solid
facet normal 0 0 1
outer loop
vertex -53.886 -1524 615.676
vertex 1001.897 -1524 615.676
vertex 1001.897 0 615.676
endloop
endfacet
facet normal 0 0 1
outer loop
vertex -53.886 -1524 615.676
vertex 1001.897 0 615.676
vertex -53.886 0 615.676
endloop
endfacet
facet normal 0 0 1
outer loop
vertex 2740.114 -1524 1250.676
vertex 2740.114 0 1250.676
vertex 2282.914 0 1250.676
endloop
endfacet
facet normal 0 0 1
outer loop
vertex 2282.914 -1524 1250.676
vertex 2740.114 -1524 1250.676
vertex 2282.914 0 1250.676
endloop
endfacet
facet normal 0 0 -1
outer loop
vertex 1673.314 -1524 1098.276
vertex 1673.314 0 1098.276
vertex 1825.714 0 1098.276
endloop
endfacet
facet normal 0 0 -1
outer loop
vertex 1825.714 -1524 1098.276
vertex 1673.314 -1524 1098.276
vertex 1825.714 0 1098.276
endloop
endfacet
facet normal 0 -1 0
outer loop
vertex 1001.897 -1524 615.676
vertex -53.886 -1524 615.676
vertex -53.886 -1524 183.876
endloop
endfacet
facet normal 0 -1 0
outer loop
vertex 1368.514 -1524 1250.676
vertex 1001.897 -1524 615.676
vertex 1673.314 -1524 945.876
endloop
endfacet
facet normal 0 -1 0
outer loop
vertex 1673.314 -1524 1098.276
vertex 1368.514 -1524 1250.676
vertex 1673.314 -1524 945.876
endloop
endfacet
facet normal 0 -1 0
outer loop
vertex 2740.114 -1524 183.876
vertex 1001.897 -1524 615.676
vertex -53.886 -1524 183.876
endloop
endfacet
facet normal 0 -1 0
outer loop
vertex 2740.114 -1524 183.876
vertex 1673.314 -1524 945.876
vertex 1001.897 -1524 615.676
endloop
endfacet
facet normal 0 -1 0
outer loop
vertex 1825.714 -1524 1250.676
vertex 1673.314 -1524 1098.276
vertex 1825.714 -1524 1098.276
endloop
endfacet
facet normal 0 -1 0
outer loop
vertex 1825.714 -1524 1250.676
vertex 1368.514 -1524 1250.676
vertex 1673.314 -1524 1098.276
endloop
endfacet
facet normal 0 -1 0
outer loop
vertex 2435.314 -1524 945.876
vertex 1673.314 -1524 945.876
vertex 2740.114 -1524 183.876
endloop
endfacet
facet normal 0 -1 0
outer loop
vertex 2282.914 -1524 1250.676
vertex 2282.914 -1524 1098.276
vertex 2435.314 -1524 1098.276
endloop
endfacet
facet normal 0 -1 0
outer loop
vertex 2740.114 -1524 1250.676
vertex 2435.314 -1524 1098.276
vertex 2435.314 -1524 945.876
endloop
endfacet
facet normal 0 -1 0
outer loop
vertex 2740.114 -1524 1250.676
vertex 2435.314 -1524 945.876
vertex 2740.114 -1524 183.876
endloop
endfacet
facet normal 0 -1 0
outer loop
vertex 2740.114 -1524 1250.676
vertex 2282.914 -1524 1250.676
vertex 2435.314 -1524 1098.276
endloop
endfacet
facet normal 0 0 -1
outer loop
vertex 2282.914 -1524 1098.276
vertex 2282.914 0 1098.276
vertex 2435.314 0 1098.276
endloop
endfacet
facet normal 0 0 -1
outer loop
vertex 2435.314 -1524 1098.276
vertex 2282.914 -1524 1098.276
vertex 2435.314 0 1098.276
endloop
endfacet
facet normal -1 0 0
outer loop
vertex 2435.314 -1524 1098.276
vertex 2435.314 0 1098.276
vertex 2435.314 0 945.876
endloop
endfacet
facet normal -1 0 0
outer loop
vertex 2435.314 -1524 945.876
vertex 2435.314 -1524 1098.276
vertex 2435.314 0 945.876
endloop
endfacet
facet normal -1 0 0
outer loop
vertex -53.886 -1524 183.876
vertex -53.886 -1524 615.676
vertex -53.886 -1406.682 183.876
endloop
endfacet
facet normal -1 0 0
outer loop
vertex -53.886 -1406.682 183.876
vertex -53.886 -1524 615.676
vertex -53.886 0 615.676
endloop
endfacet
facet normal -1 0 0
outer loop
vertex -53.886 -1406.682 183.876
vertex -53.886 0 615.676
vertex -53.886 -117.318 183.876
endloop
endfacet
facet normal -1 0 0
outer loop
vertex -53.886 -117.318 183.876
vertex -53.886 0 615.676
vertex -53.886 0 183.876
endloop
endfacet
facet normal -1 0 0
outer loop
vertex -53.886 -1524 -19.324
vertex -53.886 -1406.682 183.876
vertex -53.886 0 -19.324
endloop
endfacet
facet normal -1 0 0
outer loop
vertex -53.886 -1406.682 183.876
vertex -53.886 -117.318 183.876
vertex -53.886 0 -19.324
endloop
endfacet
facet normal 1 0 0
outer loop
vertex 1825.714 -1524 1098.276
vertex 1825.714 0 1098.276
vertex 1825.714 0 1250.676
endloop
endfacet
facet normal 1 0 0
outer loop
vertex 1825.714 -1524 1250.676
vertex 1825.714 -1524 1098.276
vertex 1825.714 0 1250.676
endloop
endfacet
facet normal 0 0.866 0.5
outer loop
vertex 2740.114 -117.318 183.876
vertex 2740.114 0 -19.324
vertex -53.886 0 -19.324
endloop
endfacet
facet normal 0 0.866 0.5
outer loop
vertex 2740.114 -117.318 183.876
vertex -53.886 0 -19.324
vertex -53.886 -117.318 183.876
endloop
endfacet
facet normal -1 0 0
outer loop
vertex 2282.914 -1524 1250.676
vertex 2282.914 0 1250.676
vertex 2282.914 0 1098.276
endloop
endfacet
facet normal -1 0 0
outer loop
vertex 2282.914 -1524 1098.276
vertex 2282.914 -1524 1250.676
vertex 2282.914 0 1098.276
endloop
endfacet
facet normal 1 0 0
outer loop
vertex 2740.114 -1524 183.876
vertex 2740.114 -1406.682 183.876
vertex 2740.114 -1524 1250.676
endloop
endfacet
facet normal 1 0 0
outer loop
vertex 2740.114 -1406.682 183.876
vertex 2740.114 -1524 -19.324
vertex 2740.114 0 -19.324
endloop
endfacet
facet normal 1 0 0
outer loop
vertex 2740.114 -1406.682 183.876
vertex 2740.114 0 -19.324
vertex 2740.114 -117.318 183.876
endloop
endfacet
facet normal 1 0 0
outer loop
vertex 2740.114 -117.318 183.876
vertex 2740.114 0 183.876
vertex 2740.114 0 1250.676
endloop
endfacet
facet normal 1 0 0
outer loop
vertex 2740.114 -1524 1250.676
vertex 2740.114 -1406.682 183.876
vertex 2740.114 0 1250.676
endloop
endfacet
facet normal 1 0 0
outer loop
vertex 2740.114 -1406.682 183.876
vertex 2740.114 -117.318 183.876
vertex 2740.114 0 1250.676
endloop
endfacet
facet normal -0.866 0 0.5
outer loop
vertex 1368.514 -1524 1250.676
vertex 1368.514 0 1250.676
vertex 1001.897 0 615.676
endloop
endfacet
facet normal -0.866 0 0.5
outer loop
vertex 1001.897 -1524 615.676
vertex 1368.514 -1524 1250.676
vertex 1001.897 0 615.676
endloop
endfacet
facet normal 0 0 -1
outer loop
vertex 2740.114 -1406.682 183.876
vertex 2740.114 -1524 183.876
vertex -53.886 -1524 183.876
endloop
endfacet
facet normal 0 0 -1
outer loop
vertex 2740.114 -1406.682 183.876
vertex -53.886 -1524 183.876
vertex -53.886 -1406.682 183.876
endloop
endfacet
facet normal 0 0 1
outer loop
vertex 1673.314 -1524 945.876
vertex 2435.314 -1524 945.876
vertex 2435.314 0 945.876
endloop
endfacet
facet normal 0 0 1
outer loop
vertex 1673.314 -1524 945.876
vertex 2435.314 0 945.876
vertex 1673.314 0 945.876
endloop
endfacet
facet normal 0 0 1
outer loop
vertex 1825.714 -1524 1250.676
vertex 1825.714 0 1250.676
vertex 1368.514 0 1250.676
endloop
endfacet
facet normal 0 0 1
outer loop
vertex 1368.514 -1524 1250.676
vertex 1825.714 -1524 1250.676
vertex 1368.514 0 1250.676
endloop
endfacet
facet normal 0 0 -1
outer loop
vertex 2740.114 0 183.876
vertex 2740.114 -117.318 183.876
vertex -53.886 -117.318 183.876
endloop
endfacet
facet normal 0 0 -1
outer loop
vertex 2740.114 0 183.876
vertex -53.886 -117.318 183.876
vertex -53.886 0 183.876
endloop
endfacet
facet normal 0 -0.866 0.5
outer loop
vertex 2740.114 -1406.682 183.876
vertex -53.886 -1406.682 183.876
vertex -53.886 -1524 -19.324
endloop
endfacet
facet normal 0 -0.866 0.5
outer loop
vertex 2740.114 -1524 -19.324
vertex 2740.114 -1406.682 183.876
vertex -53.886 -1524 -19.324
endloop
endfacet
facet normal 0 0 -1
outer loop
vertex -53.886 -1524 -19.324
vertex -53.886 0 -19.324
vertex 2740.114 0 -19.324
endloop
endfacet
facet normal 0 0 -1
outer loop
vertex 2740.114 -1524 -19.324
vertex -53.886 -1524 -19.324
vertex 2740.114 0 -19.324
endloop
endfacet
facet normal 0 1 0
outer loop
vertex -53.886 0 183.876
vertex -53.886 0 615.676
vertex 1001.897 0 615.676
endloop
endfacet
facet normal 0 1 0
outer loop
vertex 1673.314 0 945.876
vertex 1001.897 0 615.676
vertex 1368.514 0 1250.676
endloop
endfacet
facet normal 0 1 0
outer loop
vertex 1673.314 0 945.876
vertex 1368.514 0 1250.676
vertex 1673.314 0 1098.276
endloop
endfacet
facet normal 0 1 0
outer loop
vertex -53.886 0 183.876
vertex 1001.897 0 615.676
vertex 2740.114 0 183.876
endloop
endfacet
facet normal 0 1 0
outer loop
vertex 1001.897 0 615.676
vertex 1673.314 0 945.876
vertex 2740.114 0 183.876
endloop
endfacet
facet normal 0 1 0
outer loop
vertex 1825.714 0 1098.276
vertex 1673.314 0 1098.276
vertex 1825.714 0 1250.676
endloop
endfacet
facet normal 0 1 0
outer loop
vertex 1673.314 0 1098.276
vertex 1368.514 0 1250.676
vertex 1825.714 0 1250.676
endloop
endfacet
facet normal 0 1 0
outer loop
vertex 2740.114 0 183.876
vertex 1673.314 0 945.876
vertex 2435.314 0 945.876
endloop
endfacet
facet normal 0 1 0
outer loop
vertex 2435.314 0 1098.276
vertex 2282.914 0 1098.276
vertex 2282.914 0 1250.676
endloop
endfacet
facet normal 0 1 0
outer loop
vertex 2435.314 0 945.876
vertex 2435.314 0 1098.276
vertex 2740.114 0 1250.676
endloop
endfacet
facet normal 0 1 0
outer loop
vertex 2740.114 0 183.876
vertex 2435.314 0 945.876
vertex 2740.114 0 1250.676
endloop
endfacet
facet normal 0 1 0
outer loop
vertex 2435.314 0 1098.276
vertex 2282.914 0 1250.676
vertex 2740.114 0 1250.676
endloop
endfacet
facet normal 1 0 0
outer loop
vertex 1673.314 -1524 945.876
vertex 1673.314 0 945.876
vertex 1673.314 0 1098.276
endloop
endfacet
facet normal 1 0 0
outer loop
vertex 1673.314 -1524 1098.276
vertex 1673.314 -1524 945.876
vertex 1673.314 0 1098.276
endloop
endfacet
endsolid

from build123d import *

# Parameters (mm, degrees)
F1_DEPTH = 1524
F3_DEPTH = 2794.001
F5_DEPTH = 2794.001


with BuildPart() as f1:
    # F0 (on Front) → F1 (new body)
    with BuildSketch(Plane.XZ):
        Polygon((-53.885602, 615.67555), (-53.885602, -19.32445), (2740.114398, -19.32445), (2740.114398, 1250.67555), (2282.914398, 1250.67555), (2282.914398, 1098.27555), (2435.314398, 1098.27555), (2435.314398, 945.87555), (1673.314398, 945.87555), (1673.314398, 1098.27555), (1825.714398, 1098.27555), (1825.714398, 1250.67555), (1368.514398, 1250.67555), (1001.896977, 615.67555), align=None)
    extrude(amount=F1_DEPTH)

    # F2 (on face) → F3 (cut, through all)
    with BuildSketch(Plane(origin=(-53.885602, 0, 0), x_dir=(0, -1, 0), z_dir=(-1, 0, 0))):
        Polygon((0, 183.87555), (0, -19.32445), (117.317575, 183.87555), align=None)
    extrude(amount=-F3_DEPTH, mode=Mode.SUBTRACT)

    # F4 (on face) → F5 (cut, through all)
    with BuildSketch(Plane(origin=(-53.885602, 0, 0), x_dir=(0, -1, 0), z_dir=(-1, 0, 0))):
        Polygon((1406.682425, 183.87555), (1524, -19.32445), (1524, 183.87555), align=None)
    extrude(amount=-F5_DEPTH, mode=Mode.SUBTRACT)


solid = f1.part
